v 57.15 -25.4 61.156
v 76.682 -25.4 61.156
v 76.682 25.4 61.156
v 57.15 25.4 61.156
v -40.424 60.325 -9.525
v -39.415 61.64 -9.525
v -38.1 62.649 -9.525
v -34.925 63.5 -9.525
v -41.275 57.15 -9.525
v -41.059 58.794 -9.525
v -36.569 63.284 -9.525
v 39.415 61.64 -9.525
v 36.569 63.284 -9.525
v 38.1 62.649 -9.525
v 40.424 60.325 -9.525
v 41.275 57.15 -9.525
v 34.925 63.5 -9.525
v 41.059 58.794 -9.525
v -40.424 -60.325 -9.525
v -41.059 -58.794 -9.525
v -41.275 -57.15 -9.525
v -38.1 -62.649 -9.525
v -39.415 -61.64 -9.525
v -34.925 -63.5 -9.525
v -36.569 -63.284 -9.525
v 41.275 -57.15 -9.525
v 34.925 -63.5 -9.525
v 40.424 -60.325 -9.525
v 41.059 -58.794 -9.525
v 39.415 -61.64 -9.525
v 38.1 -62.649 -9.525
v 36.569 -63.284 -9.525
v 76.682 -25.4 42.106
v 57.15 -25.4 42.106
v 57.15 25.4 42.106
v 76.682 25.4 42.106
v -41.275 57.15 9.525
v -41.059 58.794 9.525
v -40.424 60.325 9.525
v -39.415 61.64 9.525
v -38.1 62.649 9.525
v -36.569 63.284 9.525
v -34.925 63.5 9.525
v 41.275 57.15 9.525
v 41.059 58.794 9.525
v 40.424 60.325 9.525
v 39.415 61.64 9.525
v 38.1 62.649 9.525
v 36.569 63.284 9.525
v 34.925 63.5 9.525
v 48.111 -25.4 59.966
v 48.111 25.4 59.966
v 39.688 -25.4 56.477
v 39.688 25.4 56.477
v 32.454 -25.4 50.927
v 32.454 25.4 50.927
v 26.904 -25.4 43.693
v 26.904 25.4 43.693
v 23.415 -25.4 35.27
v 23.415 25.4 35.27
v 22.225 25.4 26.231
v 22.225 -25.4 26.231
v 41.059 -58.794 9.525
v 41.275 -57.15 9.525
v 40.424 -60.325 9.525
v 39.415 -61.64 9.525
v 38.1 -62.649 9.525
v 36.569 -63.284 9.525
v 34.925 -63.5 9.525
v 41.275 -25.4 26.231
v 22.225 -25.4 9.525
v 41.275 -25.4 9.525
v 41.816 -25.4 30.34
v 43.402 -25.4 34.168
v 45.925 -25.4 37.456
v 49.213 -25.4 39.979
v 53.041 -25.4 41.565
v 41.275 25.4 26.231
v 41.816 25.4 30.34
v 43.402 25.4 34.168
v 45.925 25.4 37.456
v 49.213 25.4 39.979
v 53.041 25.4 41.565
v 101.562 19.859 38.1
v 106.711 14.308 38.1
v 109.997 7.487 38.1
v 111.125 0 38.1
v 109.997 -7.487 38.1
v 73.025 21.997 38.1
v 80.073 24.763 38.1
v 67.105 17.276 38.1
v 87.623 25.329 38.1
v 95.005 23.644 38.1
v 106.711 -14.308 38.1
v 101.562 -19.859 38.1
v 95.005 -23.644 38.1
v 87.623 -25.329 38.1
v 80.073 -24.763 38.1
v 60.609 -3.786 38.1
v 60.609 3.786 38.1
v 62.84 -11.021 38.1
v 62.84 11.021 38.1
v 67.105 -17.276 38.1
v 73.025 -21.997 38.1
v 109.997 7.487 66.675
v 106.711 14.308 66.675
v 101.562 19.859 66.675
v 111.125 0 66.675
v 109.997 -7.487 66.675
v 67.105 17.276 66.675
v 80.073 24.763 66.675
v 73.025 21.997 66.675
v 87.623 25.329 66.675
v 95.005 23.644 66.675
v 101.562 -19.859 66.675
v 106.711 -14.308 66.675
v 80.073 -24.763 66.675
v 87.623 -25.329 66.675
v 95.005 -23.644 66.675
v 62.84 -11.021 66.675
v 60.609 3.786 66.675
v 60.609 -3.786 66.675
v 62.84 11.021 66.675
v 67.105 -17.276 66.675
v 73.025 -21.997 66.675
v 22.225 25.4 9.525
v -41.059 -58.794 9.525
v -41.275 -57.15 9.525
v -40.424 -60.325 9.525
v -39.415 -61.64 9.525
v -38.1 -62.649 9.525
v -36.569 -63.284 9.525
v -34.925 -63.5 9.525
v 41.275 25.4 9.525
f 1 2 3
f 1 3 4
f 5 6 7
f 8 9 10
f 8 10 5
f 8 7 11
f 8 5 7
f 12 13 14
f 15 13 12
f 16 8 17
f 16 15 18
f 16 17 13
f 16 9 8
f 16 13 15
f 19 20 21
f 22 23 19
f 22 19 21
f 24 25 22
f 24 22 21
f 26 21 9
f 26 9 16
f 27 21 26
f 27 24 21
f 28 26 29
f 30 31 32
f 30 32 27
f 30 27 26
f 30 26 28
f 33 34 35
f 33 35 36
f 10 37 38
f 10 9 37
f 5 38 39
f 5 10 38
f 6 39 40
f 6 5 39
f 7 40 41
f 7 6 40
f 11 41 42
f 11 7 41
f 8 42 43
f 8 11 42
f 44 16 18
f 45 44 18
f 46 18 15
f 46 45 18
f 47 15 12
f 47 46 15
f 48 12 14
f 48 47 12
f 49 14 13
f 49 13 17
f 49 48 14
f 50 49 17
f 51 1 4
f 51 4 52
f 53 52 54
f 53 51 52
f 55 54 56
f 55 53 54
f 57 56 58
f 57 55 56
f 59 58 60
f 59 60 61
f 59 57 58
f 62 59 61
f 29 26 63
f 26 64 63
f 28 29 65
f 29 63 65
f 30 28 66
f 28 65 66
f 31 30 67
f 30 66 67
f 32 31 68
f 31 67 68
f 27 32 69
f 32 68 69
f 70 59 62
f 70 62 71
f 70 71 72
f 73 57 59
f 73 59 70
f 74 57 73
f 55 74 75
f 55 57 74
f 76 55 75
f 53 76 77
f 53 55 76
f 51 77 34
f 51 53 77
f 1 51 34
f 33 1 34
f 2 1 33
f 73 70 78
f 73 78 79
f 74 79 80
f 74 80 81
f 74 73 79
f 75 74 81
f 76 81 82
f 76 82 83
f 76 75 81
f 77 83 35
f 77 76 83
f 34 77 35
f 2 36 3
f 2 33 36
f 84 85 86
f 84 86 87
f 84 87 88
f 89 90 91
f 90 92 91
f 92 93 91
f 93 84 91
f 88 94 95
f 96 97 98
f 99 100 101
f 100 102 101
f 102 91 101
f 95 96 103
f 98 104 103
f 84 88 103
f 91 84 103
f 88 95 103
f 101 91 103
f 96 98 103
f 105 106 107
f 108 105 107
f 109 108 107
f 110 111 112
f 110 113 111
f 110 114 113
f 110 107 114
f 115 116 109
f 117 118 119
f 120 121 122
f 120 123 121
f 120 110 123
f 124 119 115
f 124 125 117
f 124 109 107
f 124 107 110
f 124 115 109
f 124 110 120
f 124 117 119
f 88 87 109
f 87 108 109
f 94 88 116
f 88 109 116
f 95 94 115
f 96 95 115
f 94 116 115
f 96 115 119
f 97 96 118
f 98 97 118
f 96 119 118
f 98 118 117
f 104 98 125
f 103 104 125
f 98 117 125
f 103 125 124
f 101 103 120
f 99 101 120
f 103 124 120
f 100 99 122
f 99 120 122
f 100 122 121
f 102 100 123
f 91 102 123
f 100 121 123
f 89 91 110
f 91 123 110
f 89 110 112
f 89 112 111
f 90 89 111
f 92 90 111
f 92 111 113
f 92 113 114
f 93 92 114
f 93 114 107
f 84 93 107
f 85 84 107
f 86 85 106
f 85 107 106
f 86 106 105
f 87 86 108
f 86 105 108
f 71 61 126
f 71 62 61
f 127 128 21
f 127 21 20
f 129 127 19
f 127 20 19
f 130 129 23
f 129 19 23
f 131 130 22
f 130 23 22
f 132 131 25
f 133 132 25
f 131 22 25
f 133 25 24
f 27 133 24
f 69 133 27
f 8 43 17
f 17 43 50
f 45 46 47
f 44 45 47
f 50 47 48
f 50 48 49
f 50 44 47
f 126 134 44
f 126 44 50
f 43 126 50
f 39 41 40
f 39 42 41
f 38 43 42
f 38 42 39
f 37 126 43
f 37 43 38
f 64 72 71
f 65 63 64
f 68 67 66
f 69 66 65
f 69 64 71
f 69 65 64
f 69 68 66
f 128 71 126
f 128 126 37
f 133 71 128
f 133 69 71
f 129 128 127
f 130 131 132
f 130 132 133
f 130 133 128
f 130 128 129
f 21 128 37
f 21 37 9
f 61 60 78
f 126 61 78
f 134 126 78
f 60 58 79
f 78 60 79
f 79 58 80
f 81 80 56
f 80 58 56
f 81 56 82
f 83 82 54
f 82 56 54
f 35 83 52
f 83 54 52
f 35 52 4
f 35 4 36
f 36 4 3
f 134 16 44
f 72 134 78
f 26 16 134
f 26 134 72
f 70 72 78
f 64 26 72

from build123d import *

# Parameters (mm, degrees)
F1_DEPTH = 63.5
F0_W     = 16.3567779206
F0_H     = 19.05
F2_DEPTH = 25.4
F3_DEPTH = 7.9375
F0_W_2   = 25.4
F0_H_2   = 28.575
F5_R     = 6.35


with BuildPart() as f1:
    # F0 (on Front) → F1 (new body, symmetric)
    with BuildSketch(Plane.XZ):
        Polygon((22.225, 9.525), (-41.275, 9.525), (-41.275, -9.525), (41.275, -9.525), (41.275, 9.525), align=None)
    extrude(amount=F1_DEPTH, both=True)

    # F0 (on Front) → F2 (join, symmetric)
    with BuildSketch(Plane.XZ):
        with Locations((68.5033889603, 51.6308948087)):
            Rectangle(F0_W, F0_H)
        with BuildLine():
            Line((60.325, 61.1558948087), (57.15, 61.1558948087))
            ThreePointArc((57.15, 61.1558948087), (32.4542956671, 50.9265991416), (22.225, 26.2308948087))
            Line((22.225, 26.2308948087), (22.225, 9.525))
            Line((22.225, 9.525), (41.275, 9.525))
            Line((41.275, 9.525), (41.275, 17.8779474043))
            Line((41.275, 17.8779474043), (41.275, 26.2308948087))
            ThreePointArc((41.275, 26.2308948087), (45.9246798487, 37.45621496), (57.15, 42.1058948087))
            Line((57.15, 42.1058948087), (60.325, 42.1058948087))
            Line((60.325, 42.1058948087), (60.325, 61.1558948087))
        make_face()
    extrude(amount=F2_DEPTH, both=True)

    # F0 (on Front) → F3 (join, symmetric)
    with BuildSketch(Plane.XZ):
        with BuildLine():
            Line((60.325, 61.1558948087), (57.15, 61.1558948087))
            ThreePointArc((57.15, 61.1558948087), (32.4542956671, 50.9265991416), (22.225, 26.2308948087))
            Line((22.225, 26.2308948087), (22.225, 9.525))
            Line((22.225, 9.525), (41.275, 9.525))
            Line((41.275, 9.525), (41.275, 17.8779474043))
            Line((41.275, 17.8779474043), (41.275, 26.2308948087))
            ThreePointArc((41.275, 26.2308948087), (45.9246798487, 37.45621496), (57.15, 42.1058948087))
            Line((57.15, 42.1058948087), (60.325, 42.1058948087))
            Line((60.325, 42.1058948087), (60.325, 61.1558948087))
        make_face()
    extrude(amount=F3_DEPTH, both=True)

    # F5
    f5_edges = [f1.edges().sort_by_distance(p)[0] for p in [
        (-41.275, -63.5, 0),
        (41.275, -63.5, 0),
        (41.275, 63.5, 0),
        (-41.275, 63.5, 0),
    ]]
    fillet(f5_edges, radius=F5_R)


with BuildPart() as f4:
    # F0 (on Front) → F4 (revolve)
    with BuildSketch(Plane.XZ):
        with Locations((98.425, 52.3875)):
            Rectangle(F0_W_2, F0_H_2)
    revolve(axis=Axis((85.725, 0, 52.3875), (0, 0, -1)))


solid = Compound([f1.part, f4.part])
